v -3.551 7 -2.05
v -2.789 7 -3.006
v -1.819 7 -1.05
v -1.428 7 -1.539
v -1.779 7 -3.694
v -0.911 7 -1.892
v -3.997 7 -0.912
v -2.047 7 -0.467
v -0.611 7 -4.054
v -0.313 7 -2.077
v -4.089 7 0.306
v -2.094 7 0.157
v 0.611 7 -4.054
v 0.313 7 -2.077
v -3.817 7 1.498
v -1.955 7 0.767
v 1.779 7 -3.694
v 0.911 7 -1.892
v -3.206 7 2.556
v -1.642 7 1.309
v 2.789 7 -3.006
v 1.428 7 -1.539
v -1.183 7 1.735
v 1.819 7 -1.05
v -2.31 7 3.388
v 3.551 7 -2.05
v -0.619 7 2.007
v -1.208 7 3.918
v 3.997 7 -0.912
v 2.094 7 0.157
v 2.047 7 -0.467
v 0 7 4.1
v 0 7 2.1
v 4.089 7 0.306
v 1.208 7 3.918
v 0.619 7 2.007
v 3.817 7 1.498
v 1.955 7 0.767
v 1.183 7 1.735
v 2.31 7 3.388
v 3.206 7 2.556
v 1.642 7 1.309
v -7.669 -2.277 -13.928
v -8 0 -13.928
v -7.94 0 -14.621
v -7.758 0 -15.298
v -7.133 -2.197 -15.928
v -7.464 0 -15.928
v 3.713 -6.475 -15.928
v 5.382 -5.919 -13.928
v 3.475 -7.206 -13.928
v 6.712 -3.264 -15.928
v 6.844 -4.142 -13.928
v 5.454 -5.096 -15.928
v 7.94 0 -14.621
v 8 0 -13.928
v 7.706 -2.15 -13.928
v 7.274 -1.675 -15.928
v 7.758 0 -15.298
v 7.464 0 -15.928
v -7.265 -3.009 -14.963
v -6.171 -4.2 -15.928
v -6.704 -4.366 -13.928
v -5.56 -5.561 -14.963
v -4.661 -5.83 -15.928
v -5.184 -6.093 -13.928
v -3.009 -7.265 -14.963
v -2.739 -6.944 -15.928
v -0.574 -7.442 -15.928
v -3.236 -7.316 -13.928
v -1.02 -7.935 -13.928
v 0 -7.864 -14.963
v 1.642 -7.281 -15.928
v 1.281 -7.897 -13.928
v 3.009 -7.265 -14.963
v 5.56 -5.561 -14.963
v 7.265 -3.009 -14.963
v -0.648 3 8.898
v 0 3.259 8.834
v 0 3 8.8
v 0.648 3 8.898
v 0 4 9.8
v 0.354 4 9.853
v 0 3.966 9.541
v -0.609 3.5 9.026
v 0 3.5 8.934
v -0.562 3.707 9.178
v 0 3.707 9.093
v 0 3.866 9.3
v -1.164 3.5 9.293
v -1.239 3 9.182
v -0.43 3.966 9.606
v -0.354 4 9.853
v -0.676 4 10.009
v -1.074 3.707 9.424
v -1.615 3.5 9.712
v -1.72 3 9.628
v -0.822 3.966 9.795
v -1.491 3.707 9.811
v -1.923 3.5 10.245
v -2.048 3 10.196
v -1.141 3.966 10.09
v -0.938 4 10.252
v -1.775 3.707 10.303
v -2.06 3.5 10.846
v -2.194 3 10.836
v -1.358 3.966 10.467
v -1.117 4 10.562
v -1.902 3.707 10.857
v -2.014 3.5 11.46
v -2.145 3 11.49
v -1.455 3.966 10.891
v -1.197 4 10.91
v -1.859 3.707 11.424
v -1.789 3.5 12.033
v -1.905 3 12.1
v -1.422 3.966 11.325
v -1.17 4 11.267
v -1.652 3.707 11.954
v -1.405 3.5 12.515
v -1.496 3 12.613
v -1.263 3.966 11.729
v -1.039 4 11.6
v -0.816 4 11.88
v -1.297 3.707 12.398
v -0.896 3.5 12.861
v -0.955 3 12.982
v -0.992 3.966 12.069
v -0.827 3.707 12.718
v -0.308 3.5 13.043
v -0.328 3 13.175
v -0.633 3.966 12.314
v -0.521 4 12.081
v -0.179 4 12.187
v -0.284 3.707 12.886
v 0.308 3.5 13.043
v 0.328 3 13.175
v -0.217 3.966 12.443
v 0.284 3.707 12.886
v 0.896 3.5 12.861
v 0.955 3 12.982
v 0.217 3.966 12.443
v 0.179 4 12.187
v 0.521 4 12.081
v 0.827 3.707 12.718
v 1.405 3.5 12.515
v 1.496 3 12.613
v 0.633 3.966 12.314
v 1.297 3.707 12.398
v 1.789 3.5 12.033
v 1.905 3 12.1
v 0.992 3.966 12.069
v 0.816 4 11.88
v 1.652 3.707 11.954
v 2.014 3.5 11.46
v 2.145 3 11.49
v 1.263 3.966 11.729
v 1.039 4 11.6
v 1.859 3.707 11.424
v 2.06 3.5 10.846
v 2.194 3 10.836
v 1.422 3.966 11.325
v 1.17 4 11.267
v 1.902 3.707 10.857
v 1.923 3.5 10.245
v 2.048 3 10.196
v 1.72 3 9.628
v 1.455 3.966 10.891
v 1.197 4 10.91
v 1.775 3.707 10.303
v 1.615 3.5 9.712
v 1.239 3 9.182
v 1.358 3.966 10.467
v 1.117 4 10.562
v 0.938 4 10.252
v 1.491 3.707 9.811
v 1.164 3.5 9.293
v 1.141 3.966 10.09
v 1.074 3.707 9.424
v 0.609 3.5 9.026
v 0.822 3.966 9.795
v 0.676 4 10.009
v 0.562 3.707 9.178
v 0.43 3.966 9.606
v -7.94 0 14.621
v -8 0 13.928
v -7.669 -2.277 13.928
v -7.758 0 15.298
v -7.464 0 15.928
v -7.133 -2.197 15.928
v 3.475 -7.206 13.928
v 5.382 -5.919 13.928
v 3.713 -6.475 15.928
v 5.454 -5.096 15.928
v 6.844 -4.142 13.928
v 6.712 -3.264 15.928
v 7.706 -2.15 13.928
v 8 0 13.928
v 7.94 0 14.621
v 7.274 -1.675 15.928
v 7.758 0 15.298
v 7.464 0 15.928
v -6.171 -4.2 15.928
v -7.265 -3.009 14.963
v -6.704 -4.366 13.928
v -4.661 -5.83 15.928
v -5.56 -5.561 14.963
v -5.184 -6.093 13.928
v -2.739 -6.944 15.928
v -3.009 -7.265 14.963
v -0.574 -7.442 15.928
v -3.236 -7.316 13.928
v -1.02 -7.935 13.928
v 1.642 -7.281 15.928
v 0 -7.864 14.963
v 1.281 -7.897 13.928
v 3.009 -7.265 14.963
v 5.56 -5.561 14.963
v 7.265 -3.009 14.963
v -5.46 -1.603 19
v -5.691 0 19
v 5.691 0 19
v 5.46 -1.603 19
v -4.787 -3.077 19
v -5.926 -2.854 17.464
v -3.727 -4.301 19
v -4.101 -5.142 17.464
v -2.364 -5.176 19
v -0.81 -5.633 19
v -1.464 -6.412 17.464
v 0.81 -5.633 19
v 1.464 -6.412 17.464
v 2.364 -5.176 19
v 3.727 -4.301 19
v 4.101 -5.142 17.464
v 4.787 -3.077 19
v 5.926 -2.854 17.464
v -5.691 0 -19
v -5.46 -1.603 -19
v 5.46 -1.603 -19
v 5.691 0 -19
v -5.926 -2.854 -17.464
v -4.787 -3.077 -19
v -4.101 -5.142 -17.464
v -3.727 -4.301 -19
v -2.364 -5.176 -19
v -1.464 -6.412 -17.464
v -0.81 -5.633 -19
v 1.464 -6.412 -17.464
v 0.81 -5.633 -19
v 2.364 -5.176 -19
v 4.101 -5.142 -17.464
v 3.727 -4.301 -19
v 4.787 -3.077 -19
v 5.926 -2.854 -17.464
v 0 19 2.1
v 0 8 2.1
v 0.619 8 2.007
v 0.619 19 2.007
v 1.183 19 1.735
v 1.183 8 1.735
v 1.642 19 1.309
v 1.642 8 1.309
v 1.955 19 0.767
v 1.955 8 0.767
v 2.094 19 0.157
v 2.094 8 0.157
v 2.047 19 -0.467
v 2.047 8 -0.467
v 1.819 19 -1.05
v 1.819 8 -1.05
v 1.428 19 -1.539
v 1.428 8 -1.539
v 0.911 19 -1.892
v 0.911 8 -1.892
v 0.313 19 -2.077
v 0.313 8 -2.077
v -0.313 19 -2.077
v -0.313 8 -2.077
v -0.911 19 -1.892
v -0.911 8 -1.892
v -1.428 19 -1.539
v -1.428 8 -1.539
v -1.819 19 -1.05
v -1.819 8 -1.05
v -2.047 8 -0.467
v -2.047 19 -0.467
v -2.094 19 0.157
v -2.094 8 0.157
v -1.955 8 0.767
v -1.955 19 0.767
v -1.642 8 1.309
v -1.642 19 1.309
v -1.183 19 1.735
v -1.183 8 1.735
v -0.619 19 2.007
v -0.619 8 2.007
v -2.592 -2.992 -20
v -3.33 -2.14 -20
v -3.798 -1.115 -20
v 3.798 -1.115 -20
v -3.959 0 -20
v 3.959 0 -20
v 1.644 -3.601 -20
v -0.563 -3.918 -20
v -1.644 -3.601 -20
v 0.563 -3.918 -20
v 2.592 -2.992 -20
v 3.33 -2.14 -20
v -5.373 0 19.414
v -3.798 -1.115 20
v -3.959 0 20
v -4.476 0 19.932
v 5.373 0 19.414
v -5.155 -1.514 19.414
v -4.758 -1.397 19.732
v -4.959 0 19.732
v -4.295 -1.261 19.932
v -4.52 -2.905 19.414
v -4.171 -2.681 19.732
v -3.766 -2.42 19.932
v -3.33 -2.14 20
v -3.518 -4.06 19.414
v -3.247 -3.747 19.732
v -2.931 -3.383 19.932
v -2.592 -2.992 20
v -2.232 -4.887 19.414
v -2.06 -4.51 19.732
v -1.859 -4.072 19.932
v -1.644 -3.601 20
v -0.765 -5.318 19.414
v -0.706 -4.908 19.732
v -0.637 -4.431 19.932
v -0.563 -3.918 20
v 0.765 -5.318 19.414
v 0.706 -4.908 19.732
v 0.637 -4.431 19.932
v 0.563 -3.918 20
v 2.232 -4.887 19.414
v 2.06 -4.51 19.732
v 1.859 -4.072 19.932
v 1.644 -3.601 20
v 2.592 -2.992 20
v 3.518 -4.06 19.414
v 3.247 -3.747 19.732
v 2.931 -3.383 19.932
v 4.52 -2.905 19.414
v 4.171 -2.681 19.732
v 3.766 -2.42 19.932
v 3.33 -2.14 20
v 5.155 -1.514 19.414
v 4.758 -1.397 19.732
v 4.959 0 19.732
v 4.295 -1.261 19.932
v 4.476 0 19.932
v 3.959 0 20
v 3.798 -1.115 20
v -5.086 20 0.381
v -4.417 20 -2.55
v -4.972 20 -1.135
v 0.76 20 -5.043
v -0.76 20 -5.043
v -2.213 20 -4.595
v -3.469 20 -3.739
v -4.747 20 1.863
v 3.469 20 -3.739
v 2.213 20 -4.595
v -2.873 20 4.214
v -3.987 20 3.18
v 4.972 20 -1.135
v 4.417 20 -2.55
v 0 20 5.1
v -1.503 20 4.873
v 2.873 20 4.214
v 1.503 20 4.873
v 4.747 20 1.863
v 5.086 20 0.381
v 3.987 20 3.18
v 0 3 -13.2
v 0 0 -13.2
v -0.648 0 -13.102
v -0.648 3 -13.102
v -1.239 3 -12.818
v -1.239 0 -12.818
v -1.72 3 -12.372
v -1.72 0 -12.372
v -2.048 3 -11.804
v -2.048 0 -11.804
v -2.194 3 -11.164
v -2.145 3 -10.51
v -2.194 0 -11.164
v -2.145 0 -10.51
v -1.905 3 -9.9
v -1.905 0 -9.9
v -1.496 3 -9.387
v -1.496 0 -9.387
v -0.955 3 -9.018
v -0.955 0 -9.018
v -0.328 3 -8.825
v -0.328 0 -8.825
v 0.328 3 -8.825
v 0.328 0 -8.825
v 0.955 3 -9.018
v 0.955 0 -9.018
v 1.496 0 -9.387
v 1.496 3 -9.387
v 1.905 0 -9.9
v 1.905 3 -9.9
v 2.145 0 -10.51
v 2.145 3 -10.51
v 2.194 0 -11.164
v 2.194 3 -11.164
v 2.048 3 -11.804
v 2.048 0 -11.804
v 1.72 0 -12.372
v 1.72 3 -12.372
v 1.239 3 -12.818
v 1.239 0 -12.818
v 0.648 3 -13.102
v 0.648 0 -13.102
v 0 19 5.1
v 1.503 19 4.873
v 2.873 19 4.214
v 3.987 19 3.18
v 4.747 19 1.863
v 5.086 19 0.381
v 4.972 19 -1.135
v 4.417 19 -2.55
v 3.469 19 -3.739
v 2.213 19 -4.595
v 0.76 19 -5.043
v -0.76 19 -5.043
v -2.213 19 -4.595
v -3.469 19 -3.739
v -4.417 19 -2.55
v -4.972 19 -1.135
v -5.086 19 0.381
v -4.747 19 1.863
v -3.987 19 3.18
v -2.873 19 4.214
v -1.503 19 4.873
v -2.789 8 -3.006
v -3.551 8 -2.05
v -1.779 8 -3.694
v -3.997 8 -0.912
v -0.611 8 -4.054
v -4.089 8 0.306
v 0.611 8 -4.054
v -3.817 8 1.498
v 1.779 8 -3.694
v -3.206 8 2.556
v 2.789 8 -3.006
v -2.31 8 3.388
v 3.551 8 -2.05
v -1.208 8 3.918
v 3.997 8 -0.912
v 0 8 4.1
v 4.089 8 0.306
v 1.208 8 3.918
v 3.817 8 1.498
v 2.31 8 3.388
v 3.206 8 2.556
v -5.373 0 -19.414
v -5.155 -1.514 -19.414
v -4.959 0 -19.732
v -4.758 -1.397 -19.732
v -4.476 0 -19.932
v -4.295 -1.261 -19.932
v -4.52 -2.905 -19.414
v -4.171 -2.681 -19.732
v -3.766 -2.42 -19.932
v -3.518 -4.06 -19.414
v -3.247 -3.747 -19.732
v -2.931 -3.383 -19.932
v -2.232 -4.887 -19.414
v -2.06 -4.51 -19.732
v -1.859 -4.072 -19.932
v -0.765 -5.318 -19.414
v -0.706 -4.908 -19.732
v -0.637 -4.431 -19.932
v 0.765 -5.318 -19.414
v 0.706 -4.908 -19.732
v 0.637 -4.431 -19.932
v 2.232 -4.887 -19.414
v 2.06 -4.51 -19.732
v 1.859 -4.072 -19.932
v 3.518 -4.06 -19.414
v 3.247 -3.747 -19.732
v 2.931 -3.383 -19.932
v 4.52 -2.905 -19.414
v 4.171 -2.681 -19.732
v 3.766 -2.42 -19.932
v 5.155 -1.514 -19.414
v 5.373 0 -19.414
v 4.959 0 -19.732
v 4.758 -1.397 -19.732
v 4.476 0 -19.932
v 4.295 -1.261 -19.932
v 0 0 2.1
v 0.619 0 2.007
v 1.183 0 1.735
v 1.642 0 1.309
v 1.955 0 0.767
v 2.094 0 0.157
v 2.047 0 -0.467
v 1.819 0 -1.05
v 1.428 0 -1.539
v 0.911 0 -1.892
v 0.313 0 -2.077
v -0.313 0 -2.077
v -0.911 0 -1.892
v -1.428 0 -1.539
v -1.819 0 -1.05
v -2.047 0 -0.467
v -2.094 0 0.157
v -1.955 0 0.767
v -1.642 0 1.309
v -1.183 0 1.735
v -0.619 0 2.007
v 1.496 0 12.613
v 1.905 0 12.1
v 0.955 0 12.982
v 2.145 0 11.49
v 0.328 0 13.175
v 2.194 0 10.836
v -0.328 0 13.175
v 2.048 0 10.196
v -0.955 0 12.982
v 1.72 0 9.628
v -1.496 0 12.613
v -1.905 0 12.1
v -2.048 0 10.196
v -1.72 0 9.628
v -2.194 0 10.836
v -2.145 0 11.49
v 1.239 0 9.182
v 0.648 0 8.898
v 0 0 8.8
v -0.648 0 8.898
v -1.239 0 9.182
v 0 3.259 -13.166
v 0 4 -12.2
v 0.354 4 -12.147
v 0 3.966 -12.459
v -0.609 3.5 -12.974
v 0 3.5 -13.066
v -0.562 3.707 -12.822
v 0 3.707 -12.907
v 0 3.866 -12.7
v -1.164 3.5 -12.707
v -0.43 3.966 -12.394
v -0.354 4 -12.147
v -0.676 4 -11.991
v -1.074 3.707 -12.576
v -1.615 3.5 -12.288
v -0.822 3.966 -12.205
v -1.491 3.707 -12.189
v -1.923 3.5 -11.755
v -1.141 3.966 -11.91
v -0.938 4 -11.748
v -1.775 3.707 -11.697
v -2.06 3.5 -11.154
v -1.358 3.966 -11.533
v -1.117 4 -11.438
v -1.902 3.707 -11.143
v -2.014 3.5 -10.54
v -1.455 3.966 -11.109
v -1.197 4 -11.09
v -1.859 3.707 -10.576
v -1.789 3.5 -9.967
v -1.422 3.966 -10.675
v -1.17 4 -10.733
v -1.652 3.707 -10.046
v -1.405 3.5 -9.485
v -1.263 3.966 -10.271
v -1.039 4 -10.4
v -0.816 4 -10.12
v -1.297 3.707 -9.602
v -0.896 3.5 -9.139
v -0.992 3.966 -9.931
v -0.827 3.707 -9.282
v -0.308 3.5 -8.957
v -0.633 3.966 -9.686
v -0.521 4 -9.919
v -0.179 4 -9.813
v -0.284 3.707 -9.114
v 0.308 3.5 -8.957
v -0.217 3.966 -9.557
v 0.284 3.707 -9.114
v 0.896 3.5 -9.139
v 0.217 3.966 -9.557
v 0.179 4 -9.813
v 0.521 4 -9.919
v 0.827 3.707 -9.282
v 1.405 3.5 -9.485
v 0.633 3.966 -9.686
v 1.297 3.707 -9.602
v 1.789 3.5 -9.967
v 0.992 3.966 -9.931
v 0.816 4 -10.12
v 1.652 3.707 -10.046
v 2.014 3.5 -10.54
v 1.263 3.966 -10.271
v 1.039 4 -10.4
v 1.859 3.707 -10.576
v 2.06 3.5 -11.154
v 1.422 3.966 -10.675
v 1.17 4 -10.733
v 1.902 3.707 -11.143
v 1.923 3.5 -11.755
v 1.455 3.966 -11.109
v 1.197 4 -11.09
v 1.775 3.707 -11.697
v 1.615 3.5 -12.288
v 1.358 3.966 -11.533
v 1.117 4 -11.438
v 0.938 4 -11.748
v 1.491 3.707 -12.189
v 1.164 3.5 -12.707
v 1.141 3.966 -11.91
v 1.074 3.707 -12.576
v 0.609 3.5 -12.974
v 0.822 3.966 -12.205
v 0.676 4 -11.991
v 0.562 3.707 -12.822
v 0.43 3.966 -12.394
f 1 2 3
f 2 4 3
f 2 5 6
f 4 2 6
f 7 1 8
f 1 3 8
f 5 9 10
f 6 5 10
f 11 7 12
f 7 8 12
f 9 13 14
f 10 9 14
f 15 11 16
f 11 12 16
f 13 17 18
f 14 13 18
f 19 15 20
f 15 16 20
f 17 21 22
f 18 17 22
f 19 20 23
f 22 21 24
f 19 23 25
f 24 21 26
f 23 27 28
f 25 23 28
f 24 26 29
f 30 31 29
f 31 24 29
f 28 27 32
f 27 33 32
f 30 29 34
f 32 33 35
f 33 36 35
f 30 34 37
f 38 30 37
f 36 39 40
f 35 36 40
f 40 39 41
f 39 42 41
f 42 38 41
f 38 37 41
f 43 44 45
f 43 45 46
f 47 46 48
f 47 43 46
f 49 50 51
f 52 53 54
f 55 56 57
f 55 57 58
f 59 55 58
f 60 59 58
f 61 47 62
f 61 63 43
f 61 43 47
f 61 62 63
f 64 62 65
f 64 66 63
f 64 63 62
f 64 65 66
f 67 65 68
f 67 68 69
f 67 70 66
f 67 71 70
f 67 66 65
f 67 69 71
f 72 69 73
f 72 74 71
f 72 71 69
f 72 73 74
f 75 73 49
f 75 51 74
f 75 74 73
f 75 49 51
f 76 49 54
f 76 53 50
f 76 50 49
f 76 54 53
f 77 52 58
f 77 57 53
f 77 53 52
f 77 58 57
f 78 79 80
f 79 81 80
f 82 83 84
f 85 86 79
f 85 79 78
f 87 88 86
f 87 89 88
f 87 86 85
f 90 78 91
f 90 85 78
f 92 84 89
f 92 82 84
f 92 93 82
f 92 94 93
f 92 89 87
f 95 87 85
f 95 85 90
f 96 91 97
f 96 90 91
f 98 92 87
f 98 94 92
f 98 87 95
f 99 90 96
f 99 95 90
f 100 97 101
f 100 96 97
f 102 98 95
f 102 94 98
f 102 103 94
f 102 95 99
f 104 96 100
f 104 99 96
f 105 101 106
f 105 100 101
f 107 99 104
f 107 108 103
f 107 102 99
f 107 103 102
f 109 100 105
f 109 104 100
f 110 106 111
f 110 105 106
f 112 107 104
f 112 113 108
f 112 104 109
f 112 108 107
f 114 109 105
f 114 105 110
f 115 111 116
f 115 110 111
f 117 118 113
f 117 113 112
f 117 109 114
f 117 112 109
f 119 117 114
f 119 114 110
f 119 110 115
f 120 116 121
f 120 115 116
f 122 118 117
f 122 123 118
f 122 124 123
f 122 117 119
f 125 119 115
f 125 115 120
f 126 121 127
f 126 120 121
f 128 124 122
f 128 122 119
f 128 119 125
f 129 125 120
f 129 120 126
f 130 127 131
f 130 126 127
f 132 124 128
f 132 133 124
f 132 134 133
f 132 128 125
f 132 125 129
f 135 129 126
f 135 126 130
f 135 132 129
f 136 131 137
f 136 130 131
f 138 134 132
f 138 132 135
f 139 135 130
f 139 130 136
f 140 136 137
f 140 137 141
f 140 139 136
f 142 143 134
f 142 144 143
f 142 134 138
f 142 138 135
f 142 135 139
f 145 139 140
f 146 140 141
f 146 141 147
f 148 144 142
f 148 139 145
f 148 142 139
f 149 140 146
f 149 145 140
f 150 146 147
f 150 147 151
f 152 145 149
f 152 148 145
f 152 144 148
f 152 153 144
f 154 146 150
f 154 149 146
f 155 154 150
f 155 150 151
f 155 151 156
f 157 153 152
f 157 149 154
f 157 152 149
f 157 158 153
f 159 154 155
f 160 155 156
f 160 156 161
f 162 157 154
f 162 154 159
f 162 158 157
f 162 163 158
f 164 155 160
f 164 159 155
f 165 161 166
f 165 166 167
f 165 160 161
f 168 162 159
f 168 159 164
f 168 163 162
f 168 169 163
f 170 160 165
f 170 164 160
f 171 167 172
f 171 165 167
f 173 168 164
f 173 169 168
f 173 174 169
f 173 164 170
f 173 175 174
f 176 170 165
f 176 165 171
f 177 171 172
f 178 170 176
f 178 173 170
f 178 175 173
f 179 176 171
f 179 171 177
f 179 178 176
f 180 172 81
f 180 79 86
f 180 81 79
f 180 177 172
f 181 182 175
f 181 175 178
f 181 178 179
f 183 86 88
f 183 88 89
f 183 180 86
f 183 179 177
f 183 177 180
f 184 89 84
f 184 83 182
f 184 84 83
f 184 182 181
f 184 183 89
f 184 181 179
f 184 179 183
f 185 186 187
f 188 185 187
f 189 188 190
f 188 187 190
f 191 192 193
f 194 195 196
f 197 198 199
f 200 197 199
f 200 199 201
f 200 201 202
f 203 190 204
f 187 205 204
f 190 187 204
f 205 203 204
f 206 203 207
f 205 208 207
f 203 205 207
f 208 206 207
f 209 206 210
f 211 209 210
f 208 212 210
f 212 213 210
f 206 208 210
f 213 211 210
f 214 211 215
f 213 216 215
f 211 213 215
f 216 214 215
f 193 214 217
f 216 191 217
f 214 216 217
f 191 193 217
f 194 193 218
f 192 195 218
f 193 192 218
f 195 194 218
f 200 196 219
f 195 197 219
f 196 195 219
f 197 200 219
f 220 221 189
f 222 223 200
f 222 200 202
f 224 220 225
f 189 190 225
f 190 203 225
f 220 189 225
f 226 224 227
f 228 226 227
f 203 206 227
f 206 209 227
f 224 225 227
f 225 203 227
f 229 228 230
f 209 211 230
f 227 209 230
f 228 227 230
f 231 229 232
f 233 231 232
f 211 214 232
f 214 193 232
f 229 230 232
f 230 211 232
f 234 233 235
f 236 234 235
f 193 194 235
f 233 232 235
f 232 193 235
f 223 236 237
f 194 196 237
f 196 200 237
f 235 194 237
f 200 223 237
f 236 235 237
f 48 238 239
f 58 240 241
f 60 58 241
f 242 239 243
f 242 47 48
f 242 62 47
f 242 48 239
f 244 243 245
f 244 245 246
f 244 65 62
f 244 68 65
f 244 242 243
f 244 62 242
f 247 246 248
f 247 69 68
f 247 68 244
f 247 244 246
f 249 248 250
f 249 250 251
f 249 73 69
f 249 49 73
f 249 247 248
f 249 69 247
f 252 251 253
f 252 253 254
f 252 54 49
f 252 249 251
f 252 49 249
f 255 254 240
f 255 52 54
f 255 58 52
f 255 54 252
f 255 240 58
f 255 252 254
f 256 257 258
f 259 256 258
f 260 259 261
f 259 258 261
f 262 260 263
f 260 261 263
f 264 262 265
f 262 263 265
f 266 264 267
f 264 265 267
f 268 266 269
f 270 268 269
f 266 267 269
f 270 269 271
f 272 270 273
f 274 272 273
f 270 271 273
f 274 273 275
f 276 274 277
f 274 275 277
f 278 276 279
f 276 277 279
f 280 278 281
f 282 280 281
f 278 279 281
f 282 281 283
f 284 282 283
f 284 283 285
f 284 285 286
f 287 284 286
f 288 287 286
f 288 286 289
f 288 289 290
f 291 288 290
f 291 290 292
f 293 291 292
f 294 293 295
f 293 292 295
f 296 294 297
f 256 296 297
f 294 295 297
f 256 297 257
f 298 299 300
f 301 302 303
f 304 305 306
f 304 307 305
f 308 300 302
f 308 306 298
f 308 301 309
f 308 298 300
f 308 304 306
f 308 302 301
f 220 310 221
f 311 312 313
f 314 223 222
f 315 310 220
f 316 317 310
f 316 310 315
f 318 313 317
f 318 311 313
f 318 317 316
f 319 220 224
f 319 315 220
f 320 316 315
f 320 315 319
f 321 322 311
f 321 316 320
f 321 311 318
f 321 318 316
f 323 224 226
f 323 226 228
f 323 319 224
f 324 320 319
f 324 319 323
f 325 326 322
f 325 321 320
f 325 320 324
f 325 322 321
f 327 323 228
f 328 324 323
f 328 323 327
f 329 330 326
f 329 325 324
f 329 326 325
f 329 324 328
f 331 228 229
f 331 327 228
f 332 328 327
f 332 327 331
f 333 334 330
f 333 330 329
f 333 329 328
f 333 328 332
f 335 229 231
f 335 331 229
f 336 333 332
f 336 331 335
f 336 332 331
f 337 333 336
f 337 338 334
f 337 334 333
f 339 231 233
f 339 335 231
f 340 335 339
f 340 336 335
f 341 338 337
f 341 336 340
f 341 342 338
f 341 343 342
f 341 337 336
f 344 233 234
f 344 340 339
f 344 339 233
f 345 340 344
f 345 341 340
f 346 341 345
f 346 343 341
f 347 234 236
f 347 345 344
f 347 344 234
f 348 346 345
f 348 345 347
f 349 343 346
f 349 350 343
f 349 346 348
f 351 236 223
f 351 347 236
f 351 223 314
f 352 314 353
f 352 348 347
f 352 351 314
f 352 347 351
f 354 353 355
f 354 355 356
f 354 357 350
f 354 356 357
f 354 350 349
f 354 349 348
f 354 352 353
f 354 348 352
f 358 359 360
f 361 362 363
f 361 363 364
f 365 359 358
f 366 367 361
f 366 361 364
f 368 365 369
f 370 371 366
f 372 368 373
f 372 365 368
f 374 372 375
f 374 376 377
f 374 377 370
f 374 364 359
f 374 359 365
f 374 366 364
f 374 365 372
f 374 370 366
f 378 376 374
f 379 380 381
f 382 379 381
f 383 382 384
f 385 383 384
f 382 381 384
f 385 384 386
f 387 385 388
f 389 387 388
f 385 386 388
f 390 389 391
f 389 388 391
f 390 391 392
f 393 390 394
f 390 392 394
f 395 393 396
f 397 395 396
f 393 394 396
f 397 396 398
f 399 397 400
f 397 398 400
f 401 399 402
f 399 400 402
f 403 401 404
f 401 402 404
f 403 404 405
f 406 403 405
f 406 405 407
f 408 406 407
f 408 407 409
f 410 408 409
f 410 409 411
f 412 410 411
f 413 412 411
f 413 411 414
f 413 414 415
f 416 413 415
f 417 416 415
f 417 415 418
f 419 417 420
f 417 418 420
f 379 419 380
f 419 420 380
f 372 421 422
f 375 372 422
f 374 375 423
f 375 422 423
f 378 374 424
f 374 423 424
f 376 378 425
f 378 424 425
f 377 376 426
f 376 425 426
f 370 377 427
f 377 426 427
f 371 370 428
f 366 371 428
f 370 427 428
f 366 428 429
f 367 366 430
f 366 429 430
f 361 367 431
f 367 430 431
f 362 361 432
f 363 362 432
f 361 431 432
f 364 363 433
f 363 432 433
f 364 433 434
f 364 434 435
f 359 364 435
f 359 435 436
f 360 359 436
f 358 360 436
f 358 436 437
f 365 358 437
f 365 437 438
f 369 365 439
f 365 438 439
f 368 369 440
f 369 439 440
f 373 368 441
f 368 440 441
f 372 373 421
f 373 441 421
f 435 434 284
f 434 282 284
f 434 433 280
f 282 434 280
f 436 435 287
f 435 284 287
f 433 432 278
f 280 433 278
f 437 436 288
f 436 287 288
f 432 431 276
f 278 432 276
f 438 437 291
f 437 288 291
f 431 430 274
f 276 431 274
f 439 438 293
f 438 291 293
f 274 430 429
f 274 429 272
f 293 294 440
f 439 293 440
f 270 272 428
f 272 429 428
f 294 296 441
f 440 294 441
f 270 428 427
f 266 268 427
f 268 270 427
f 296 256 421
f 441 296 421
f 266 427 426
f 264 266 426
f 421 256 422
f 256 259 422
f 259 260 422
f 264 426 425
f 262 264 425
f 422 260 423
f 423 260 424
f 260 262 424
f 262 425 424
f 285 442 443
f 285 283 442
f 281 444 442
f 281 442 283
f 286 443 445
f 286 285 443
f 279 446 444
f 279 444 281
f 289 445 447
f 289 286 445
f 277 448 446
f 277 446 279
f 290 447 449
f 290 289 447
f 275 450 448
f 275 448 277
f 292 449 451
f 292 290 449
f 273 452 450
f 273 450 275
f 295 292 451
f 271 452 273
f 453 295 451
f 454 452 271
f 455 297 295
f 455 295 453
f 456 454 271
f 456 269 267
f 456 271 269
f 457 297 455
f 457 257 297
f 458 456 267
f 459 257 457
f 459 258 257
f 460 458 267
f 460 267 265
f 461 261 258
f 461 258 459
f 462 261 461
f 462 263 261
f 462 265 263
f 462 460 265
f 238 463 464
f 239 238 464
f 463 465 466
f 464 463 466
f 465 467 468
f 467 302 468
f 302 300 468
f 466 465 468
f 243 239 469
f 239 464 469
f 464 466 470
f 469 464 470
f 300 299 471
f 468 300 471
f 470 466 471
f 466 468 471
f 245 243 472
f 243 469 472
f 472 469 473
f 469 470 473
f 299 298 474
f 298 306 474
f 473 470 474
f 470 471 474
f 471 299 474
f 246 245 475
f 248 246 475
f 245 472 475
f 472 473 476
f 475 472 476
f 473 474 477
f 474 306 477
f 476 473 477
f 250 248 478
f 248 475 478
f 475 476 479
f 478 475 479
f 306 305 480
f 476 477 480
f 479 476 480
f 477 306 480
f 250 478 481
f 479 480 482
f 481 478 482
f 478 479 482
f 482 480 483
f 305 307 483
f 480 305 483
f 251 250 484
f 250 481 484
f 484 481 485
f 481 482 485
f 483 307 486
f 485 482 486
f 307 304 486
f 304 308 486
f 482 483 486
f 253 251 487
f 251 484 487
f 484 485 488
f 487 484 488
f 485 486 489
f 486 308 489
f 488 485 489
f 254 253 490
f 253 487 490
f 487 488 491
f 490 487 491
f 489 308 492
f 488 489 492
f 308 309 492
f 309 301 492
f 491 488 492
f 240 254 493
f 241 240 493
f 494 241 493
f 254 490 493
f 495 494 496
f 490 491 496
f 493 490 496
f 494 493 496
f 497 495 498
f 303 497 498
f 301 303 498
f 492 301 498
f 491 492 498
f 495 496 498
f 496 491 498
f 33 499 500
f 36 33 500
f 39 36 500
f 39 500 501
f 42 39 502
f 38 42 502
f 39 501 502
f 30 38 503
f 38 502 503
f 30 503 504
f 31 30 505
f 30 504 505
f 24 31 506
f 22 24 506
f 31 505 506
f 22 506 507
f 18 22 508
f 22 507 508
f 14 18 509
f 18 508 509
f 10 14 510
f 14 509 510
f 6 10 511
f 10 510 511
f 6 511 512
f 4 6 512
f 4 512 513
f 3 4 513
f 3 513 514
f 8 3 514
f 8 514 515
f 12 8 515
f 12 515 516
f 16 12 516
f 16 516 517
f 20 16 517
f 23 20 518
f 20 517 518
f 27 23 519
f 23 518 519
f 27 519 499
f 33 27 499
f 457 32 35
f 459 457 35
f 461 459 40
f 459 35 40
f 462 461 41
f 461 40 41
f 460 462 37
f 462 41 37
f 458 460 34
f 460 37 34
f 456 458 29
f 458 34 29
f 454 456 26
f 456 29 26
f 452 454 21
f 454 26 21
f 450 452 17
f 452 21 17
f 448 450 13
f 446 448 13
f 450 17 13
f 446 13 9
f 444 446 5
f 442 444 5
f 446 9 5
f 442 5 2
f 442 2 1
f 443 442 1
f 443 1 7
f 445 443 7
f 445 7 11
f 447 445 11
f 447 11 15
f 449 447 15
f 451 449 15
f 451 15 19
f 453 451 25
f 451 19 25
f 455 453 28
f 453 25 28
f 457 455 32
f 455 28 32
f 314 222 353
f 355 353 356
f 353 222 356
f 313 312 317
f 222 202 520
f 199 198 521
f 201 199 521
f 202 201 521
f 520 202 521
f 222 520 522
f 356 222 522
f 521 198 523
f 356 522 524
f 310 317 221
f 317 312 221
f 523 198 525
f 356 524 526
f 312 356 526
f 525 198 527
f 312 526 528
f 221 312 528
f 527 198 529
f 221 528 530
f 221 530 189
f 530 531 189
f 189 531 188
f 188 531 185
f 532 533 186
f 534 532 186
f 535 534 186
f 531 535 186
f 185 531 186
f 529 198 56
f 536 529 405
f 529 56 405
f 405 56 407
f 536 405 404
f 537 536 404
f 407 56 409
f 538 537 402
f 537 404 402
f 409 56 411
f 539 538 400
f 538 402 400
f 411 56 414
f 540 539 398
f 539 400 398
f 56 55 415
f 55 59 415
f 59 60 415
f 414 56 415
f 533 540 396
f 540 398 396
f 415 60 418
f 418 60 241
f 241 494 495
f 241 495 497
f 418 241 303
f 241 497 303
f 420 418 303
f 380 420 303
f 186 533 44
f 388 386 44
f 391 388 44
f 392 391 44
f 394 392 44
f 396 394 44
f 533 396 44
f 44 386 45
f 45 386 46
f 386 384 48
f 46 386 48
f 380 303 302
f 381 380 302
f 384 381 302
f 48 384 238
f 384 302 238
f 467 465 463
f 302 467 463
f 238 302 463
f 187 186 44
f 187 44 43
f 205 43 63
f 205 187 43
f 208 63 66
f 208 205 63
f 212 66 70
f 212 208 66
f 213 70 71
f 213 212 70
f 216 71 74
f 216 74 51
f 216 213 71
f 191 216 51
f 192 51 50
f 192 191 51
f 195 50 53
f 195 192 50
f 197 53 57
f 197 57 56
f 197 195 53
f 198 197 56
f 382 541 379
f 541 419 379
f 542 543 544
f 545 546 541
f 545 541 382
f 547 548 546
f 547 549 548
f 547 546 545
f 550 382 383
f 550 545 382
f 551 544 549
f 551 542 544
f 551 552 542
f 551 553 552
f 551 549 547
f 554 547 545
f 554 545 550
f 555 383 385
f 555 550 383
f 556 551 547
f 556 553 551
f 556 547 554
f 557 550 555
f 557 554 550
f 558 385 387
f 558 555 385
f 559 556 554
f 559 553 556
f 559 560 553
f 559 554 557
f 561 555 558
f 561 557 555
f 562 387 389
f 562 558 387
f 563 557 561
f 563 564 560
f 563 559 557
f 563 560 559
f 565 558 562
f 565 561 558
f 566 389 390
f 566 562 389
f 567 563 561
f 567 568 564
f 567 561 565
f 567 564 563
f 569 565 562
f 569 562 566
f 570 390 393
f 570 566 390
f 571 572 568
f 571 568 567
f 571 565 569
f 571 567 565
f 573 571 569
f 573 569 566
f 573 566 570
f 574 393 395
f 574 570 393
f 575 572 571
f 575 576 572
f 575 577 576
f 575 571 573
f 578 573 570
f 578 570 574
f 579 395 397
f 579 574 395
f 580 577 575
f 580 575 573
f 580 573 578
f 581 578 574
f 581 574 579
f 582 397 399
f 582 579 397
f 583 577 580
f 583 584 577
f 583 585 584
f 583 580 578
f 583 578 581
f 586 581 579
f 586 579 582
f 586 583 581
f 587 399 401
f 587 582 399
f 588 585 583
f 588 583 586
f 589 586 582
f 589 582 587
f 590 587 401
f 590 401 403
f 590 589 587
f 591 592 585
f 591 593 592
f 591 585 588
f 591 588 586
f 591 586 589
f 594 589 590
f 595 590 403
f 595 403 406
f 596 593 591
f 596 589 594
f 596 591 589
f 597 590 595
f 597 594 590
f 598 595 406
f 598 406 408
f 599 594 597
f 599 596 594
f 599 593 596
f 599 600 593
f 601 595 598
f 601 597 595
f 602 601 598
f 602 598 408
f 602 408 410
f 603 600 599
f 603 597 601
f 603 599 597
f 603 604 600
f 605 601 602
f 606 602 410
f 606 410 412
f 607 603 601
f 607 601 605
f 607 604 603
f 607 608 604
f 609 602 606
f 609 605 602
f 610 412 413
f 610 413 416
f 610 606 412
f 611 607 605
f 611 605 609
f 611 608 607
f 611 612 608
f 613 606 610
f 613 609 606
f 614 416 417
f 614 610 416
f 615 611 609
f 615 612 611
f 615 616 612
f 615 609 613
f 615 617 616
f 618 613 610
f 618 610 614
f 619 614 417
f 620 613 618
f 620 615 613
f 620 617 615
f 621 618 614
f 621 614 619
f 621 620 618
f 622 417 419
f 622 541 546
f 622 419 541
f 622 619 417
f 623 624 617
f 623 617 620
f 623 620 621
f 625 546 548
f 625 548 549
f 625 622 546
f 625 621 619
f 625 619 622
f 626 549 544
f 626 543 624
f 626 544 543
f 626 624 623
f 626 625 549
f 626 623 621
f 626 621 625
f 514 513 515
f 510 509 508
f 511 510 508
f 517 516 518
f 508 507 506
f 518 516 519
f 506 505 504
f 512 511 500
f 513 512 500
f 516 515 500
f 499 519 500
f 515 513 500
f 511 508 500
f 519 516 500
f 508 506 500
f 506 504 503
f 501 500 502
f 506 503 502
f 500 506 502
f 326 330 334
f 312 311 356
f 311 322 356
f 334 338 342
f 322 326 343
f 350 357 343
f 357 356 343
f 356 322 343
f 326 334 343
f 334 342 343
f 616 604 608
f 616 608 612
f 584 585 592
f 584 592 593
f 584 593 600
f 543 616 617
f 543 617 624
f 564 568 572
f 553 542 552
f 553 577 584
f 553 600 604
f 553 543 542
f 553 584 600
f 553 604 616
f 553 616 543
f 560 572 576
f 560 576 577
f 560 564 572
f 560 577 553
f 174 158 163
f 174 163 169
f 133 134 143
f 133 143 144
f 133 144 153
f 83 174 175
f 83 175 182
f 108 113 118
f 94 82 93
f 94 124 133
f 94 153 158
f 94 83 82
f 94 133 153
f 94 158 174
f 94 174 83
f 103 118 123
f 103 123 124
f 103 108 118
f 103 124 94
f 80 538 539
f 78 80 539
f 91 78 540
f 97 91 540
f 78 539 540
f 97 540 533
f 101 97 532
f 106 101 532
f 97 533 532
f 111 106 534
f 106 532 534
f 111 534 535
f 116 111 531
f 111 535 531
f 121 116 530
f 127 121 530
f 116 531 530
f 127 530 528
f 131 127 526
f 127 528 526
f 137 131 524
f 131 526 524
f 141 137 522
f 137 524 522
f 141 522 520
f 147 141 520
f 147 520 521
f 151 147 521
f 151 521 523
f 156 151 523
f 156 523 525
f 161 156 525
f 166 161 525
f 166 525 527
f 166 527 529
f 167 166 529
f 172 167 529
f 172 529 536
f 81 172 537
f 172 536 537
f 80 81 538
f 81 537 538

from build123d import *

# Parameters (mm, degrees)
SKETCH1_R            = 2.1
BOSS_EXTRUDE1_DEPTH  = 7
SKETCH2_R            = 4.1
BOSS_EXTRUDE2_DEPTH  = 1
SKETCH3_R            = 2.1
BOSS_EXTRUDE3_DEPTH  = 11
SKETCH4_R            = 5.1
BOSS_EXTRUDE4_DEPTH  = 1
BOSS_EXTRUDE5_DEPTH  = 15
REVOLVE1_ANGLE       = 180
FILLET1_R            = 4
FILLET2_R            = 2
FILLET1_OF_MIRROR1_R = 4
FILLET2_OF_MIRROR1_R = 2
SKETCH8_R            = 2.2
BOSS_EXTRUDE6_DEPTH  = 4
FILLET3_R            = 1


# Read off the part's stored shape, not the designer's step: Revolve1
with BuildPart() as part:
    # Sketch1 → Boss-Extrude1 (new body)
    with BuildSketch(Plane(origin=(0, 0, 0), x_dir=(1, 0, 0), z_dir=(0, 1, 0))):
        with Locations(Location((0, 0, 0), (0, 0, 270))):
            Circle(SKETCH1_R)
    extrude(amount=BOSS_EXTRUDE1_DEPTH)

    # Sketch2 → Boss-Extrude2 (add)
    with BuildSketch(Plane(origin=(0, 7, 0), x_dir=(1, 0, 0), z_dir=(0, 1, 0))):
        with Locations(Location((0, 0, 0), (0, 0, 270))):
            Circle(SKETCH2_R)
    extrude(amount=BOSS_EXTRUDE2_DEPTH)

    # Sketch3 → Boss-Extrude3 (add)
    with BuildSketch(Plane(origin=(0, 8, 0), x_dir=(1, 0, 0), z_dir=(0, 1, 0))):
        with Locations(Location((0, 0, 0), (0, 0, 270))):
            Circle(SKETCH3_R)
    extrude(amount=BOSS_EXTRUDE3_DEPTH)

    # Sketch4 → Boss-Extrude4 (add)
    with BuildSketch(Plane(origin=(0, 19, 0), x_dir=(1, 0, 0), z_dir=(0, 1, 0))):
        with Locations(Location((0, 0, 0), (0, 0, 270))):
            Circle(SKETCH4_R)
    extrude(amount=BOSS_EXTRUDE4_DEPTH)


with BuildPart() as body_2:
    # Sketch5 → Boss-Extrude5 (new, symmetric)
    with BuildSketch(Plane.XY):
        with BuildLine():
            Line((0, 0), (-8, 0))
            ThreePointArc((-8, 0), (0, -8), (8, 0))
            Line((8, 0), (0, 0))
        make_face()
    extrude(amount=BOSS_EXTRUDE5_DEPTH, both=True)

    # Revolve1 outline → Revolve1 (revolve)
    with BuildSketch(Plane(origin=(0, 0, 0), x_dir=(-1, 0, 0), z_dir=(0, 1, 0))):
        Polygon((0, -15), (0, -20), (5.113248654, -20), (8, -15), align=None)
    revolve1 = revolve(axis=Axis((0, 0, 0), (0, 0, 1)), revolution_arc=REVOLVE1_ANGLE)

    # Fillet1
    fillet1_edges = [body_2.edges().sort_by_distance(p)[0] for p in [
        (0, -8, -15),
    ]]
    fillet(fillet1_edges, radius=FILLET1_R)

    # Fillet2
    fillet2_edges = [body_2.edges().sort_by_distance(p)[0] for p in [
        (0, -5.113248654, -20),
    ]]
    fillet(fillet2_edges, radius=FILLET2_R)

    # Mirror1: Revolve1 across plane
    add(revolve1.mirror(Plane.XY))

    # Fillet1 of Mirror1
    fillet1_of_mirror1_edges = [body_2.edges().sort_by_distance(p)[0] for p in [
        (0, -8, 15),
    ]]
    fillet(fillet1_of_mirror1_edges, radius=FILLET1_OF_MIRROR1_R)

    # Fillet2 of Mirror1
    fillet2_of_mirror1_edges = [body_2.edges().sort_by_distance(p)[0] for p in [
        (0, -5.113248654, 20),
    ]]
    fillet(fillet2_of_mirror1_edges, radius=FILLET2_OF_MIRROR1_R)

    # Sketch8 → Boss-Extrude6 (add)
    with BuildSketch(Plane(origin=(0, 0, 0), x_dir=(1, 0, 0), z_dir=(0, 1, 0))):
        with Locations(Location((0, -11, 0), (0, 0, 90))):
            Circle(SKETCH8_R)
        with Locations(Location((0, 11, 0), (0, 0, 90))):
            Circle(SKETCH8_R)
    extrude(amount=BOSS_EXTRUDE6_DEPTH)

    # Fillet3
    fillet3_edges = [body_2.edges().sort_by_distance(p)[0] for p in [
        (0, 4, 13.2),
        (0, 4, -8.8),
    ]]
    fillet(fillet3_edges, radius=FILLET3_R)


solid = Compound([part.part, body_2.part])
